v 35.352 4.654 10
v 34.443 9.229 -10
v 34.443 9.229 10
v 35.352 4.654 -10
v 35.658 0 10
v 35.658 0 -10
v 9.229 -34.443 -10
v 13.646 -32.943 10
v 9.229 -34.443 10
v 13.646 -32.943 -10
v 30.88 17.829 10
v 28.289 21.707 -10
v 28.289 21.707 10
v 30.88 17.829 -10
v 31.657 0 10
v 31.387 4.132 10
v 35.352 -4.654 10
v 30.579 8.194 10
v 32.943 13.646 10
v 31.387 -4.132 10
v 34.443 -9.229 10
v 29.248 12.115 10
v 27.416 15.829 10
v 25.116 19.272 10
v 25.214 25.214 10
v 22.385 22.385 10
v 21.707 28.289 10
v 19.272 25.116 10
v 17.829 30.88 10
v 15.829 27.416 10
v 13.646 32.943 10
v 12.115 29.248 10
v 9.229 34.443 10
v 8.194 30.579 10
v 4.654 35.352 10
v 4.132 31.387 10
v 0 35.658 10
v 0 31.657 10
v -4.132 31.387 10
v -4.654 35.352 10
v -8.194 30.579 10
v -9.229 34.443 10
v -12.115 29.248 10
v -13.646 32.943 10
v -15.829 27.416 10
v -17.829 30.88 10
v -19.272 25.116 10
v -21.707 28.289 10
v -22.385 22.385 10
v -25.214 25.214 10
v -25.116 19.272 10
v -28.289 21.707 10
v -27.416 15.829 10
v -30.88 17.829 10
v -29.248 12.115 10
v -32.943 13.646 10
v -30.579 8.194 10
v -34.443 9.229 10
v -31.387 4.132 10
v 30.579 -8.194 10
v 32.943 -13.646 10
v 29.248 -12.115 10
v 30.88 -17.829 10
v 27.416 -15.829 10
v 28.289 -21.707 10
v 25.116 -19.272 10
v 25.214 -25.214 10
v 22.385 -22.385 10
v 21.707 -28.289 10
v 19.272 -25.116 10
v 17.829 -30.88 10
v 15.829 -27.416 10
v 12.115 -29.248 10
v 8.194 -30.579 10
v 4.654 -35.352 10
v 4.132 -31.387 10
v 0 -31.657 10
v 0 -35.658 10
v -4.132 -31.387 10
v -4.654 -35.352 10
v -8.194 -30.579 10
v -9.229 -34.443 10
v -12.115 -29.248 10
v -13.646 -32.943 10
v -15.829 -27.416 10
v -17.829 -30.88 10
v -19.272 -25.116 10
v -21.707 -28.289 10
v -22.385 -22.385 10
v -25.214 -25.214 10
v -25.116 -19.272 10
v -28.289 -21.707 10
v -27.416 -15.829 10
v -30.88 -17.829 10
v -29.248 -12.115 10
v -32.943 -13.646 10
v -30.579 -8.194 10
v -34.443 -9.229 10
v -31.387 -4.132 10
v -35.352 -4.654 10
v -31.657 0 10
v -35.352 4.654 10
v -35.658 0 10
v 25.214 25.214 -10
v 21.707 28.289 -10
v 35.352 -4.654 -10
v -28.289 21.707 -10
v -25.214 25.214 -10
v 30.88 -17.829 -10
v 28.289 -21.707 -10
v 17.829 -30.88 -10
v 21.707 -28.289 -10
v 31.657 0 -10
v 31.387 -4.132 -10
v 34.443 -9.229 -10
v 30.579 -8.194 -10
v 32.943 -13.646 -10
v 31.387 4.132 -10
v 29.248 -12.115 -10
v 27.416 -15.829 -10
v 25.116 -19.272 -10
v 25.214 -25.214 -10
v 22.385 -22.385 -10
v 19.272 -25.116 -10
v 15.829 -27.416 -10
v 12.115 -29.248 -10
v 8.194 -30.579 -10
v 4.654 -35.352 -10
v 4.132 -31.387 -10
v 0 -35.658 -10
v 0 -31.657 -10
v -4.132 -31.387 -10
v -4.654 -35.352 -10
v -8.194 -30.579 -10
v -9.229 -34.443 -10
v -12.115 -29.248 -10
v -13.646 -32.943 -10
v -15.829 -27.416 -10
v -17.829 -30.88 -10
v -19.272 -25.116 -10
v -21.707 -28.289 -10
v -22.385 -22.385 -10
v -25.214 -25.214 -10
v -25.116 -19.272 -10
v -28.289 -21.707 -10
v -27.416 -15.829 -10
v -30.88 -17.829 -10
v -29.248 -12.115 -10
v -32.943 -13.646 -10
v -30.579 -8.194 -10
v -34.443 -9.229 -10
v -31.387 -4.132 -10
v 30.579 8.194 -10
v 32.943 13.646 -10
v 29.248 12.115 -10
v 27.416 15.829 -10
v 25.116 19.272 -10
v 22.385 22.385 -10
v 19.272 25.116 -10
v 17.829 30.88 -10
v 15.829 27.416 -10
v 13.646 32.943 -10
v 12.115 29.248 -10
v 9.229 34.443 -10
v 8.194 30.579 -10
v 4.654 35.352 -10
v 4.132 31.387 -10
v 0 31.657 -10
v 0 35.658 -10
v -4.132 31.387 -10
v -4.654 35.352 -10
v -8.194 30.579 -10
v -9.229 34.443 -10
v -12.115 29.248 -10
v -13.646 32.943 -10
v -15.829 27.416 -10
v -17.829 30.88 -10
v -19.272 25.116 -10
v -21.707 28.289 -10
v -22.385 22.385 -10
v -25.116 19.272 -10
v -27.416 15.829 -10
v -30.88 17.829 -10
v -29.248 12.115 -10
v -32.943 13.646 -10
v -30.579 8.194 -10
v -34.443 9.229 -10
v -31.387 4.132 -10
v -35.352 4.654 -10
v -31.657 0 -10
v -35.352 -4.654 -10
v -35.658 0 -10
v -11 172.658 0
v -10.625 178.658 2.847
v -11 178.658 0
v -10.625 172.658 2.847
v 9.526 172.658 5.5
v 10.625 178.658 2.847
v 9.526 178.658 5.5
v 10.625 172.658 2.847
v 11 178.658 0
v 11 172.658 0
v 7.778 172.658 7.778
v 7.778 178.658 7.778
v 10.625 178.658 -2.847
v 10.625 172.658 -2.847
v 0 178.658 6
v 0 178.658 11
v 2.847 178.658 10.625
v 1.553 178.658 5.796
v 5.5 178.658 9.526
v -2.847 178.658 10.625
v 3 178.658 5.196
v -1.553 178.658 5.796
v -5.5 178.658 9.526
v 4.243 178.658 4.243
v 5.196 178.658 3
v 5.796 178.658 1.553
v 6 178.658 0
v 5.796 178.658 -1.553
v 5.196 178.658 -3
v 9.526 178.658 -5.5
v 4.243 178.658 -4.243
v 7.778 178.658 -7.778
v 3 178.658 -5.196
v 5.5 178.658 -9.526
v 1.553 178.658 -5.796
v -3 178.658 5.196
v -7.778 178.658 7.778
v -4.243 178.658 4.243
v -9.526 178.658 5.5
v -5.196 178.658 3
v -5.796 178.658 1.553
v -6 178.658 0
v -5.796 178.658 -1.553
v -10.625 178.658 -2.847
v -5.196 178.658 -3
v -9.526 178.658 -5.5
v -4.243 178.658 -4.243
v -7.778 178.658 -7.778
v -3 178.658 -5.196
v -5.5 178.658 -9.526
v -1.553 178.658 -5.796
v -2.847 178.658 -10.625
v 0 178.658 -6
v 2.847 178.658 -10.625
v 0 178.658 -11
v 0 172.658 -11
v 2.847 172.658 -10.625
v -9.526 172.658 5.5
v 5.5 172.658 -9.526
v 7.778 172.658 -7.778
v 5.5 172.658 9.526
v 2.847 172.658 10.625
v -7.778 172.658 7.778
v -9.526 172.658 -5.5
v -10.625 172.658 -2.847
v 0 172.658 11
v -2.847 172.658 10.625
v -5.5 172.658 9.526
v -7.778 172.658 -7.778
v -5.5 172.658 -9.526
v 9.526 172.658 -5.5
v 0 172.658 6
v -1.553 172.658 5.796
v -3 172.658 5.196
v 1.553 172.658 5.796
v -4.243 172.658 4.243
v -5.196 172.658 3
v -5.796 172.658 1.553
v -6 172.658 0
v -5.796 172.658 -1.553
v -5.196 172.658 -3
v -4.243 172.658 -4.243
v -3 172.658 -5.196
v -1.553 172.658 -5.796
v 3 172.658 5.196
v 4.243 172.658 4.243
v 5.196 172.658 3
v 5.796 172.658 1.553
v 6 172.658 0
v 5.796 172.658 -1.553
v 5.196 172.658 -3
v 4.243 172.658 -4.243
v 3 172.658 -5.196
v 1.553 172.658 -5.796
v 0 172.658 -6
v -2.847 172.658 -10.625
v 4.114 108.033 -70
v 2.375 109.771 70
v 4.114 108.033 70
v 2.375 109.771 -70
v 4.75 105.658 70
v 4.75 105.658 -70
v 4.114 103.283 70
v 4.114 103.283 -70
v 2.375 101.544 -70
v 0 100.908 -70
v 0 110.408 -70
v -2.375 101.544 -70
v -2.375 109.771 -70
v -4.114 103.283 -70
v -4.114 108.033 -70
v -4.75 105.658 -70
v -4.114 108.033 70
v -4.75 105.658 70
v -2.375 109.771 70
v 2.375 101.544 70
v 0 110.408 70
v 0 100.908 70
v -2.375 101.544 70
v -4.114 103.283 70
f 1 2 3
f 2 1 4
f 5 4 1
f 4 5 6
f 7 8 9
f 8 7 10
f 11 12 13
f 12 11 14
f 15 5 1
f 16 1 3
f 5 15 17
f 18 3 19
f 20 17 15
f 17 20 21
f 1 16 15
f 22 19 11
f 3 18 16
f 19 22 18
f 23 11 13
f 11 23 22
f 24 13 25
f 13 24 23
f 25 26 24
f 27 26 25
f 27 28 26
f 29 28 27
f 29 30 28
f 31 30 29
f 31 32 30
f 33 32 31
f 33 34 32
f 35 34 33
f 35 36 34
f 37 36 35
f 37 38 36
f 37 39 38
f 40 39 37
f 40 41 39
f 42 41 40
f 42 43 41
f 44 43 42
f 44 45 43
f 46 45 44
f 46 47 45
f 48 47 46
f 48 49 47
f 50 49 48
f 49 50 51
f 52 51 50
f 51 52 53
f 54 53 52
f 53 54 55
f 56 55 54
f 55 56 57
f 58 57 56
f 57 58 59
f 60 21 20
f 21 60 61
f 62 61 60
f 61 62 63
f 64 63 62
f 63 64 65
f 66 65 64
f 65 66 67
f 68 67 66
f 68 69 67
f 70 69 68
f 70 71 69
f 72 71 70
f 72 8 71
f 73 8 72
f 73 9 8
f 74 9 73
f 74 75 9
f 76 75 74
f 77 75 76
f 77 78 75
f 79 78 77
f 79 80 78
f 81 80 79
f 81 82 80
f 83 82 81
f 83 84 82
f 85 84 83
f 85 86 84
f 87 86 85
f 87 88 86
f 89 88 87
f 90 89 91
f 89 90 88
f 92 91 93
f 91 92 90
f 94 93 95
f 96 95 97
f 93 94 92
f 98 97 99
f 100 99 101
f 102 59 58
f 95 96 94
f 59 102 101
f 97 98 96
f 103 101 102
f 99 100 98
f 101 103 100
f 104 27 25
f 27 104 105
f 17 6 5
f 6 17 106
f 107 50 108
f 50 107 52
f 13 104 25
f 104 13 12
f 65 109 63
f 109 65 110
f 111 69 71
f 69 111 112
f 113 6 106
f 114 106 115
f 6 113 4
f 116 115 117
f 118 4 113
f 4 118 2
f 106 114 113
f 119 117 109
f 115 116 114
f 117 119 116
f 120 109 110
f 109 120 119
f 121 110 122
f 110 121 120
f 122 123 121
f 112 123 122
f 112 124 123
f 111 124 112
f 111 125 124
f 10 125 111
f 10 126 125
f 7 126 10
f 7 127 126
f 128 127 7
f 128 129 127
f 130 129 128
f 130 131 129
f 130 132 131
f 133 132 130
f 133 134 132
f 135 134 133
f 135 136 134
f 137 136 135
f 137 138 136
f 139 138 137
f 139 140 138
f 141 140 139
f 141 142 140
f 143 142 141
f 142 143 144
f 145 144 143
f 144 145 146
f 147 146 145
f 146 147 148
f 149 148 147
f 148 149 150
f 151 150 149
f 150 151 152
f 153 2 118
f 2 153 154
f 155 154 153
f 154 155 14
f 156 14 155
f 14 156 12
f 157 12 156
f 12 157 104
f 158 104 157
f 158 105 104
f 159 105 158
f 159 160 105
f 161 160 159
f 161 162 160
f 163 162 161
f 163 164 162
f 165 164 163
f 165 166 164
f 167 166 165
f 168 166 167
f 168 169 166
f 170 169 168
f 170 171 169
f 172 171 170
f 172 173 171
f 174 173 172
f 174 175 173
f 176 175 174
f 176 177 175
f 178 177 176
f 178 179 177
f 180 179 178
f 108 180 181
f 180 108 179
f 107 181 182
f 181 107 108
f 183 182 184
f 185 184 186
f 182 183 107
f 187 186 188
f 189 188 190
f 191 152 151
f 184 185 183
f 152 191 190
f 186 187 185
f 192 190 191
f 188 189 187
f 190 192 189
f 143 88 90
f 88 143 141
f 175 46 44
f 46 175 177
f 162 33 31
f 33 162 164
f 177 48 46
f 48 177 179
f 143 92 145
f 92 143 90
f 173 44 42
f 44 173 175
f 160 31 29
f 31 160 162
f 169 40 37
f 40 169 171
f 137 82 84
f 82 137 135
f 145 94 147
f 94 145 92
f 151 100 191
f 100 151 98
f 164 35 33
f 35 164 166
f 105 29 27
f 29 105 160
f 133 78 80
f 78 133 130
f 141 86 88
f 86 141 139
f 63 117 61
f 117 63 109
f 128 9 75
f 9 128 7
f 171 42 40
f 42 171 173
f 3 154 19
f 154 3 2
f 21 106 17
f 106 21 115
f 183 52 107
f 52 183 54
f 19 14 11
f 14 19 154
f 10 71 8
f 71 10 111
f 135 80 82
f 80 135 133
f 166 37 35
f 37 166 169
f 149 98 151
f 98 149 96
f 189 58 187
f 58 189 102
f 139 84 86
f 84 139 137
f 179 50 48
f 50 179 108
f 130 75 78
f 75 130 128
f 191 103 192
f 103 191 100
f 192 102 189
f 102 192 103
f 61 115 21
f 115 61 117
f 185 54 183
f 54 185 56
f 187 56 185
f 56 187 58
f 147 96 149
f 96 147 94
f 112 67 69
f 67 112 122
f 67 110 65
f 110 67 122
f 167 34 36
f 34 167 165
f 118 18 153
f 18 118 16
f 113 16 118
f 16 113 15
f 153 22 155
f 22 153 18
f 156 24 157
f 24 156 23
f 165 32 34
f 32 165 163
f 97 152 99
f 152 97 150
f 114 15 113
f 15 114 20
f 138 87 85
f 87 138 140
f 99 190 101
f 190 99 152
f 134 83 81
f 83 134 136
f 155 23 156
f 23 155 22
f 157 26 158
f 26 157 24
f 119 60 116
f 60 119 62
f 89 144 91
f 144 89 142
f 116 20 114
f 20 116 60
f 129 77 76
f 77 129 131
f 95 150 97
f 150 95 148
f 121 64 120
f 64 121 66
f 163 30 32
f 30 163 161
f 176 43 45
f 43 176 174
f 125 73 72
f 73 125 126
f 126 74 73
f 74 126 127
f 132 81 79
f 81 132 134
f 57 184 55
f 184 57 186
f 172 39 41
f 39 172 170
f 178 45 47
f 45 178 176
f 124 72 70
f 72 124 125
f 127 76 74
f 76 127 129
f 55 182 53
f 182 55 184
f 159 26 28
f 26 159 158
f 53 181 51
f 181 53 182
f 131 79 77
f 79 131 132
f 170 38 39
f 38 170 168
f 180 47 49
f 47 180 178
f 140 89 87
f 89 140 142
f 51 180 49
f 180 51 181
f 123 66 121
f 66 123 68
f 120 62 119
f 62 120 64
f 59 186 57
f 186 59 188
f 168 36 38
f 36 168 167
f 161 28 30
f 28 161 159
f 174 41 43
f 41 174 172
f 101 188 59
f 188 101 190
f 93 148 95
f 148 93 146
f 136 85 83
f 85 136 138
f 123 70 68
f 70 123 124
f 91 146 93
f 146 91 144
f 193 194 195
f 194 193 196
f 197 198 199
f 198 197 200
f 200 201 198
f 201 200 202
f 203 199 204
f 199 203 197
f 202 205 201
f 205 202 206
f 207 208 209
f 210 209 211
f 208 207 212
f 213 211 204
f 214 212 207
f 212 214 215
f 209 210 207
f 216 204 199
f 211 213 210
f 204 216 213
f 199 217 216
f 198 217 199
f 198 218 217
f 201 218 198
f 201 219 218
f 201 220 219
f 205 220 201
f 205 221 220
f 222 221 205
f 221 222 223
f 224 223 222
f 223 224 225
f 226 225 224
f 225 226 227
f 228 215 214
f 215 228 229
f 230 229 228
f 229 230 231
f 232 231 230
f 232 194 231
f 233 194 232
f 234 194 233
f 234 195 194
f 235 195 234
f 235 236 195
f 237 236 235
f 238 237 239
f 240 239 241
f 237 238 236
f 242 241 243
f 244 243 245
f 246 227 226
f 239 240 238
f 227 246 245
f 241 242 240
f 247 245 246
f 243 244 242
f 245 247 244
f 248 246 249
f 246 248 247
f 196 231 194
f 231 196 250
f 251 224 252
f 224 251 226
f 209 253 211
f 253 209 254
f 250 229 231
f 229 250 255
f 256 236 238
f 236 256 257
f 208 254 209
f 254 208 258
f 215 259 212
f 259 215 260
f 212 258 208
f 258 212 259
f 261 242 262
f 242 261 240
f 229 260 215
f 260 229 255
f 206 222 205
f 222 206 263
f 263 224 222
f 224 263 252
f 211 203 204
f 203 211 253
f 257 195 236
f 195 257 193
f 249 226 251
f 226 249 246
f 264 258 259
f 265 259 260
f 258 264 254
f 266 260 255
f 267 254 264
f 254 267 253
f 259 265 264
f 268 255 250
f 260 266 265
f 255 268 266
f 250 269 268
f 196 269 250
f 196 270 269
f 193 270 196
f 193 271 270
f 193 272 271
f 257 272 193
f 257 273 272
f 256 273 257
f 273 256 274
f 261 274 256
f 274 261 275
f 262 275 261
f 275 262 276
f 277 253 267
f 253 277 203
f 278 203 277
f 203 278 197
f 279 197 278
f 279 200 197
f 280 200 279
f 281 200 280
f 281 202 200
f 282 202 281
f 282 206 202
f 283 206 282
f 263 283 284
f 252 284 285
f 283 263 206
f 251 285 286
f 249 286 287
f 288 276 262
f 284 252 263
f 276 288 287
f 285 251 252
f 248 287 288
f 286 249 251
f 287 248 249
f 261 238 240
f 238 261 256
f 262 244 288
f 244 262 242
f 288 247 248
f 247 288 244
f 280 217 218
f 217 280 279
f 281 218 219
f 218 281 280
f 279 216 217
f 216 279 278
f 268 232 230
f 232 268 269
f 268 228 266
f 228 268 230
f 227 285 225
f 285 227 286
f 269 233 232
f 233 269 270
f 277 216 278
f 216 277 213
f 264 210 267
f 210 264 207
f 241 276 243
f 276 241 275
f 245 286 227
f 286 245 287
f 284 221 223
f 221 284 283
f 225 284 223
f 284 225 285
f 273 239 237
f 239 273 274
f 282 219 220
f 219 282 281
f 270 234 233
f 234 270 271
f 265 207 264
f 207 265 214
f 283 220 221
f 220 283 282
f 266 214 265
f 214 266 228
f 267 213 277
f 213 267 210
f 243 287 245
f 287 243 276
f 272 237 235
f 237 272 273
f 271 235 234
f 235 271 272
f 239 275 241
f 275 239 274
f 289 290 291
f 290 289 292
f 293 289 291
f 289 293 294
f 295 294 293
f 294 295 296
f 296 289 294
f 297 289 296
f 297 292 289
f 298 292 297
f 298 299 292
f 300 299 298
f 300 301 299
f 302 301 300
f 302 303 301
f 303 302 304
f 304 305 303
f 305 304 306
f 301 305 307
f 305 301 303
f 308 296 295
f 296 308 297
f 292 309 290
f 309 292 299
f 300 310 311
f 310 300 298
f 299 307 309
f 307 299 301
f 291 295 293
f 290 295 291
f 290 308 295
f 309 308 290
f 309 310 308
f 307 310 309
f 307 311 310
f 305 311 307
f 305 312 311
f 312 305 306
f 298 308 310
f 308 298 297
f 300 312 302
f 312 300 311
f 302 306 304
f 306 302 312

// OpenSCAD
// Auto-generated by scripts/author_from_manifest.py (Phase D.3).
// Source: data/phase_d_manifest.json (sku_intent='bline-b3100-c-clamp-beam').
// Do not hand-edit — regenerate from the manifest.
//
// @part bline_b3100_c_clamp_beam
// @kind hanger
// @category hanger.beam.clamp
// @display-name "B-Line B3100 C-Clamp Beam Attachment"
// @mfg eaton_b_line
// @mfg-pn B3100
// @listing UL
// @price-usd 3.25
// @install-minutes 3
// @crew journeyman
// @param size_in number default=2 label="Size" unit="in"
// @port pipe position=[0,0,0] direction=[0,1,0] style=grooved size_in=2 role=run_a

size_in = 0.0;

function od_mm(nps) =
    nps ==   1  ? 33.4 :
    nps == 1.25 ? 42.2 :
    nps == 1.5  ? 48.3 :
    nps ==   2  ? 60.3 :
    nps == 2.5  ? 73.0 :
    nps ==   3  ? 88.9 :
    nps ==   4  ? 114.3 :
    nps ==   6  ? 168.3 :
    nps ==   8  ? 219.1 : 60.3;

od = od_mm(size_in);
ring_id = od * 1.05;
ring_od = ring_id + 8;
strap_w = 20;
rod_len = 140;

union() {
    // Ring
    difference() {
        cylinder(h = strap_w, d = ring_od, center = true, $fn = 48);
        cylinder(h = strap_w + 1, d = ring_id, center = true, $fn = 48);
    }
    // Rod up +Y
    translate([0, rod_len/2 + ring_od/2, 0])
        cylinder(h = rod_len, d = 9.5, center = true, $fn = 12);
    // Top swivel eye
    translate([0, rod_len + ring_od/2, 0])
        rotate([90, 0, 0])
        difference() {
            cylinder(h = 6, d = 22, center = true, $fn = 24);
            cylinder(h = 8, d = 12, center = true, $fn = 24);
        }
}
